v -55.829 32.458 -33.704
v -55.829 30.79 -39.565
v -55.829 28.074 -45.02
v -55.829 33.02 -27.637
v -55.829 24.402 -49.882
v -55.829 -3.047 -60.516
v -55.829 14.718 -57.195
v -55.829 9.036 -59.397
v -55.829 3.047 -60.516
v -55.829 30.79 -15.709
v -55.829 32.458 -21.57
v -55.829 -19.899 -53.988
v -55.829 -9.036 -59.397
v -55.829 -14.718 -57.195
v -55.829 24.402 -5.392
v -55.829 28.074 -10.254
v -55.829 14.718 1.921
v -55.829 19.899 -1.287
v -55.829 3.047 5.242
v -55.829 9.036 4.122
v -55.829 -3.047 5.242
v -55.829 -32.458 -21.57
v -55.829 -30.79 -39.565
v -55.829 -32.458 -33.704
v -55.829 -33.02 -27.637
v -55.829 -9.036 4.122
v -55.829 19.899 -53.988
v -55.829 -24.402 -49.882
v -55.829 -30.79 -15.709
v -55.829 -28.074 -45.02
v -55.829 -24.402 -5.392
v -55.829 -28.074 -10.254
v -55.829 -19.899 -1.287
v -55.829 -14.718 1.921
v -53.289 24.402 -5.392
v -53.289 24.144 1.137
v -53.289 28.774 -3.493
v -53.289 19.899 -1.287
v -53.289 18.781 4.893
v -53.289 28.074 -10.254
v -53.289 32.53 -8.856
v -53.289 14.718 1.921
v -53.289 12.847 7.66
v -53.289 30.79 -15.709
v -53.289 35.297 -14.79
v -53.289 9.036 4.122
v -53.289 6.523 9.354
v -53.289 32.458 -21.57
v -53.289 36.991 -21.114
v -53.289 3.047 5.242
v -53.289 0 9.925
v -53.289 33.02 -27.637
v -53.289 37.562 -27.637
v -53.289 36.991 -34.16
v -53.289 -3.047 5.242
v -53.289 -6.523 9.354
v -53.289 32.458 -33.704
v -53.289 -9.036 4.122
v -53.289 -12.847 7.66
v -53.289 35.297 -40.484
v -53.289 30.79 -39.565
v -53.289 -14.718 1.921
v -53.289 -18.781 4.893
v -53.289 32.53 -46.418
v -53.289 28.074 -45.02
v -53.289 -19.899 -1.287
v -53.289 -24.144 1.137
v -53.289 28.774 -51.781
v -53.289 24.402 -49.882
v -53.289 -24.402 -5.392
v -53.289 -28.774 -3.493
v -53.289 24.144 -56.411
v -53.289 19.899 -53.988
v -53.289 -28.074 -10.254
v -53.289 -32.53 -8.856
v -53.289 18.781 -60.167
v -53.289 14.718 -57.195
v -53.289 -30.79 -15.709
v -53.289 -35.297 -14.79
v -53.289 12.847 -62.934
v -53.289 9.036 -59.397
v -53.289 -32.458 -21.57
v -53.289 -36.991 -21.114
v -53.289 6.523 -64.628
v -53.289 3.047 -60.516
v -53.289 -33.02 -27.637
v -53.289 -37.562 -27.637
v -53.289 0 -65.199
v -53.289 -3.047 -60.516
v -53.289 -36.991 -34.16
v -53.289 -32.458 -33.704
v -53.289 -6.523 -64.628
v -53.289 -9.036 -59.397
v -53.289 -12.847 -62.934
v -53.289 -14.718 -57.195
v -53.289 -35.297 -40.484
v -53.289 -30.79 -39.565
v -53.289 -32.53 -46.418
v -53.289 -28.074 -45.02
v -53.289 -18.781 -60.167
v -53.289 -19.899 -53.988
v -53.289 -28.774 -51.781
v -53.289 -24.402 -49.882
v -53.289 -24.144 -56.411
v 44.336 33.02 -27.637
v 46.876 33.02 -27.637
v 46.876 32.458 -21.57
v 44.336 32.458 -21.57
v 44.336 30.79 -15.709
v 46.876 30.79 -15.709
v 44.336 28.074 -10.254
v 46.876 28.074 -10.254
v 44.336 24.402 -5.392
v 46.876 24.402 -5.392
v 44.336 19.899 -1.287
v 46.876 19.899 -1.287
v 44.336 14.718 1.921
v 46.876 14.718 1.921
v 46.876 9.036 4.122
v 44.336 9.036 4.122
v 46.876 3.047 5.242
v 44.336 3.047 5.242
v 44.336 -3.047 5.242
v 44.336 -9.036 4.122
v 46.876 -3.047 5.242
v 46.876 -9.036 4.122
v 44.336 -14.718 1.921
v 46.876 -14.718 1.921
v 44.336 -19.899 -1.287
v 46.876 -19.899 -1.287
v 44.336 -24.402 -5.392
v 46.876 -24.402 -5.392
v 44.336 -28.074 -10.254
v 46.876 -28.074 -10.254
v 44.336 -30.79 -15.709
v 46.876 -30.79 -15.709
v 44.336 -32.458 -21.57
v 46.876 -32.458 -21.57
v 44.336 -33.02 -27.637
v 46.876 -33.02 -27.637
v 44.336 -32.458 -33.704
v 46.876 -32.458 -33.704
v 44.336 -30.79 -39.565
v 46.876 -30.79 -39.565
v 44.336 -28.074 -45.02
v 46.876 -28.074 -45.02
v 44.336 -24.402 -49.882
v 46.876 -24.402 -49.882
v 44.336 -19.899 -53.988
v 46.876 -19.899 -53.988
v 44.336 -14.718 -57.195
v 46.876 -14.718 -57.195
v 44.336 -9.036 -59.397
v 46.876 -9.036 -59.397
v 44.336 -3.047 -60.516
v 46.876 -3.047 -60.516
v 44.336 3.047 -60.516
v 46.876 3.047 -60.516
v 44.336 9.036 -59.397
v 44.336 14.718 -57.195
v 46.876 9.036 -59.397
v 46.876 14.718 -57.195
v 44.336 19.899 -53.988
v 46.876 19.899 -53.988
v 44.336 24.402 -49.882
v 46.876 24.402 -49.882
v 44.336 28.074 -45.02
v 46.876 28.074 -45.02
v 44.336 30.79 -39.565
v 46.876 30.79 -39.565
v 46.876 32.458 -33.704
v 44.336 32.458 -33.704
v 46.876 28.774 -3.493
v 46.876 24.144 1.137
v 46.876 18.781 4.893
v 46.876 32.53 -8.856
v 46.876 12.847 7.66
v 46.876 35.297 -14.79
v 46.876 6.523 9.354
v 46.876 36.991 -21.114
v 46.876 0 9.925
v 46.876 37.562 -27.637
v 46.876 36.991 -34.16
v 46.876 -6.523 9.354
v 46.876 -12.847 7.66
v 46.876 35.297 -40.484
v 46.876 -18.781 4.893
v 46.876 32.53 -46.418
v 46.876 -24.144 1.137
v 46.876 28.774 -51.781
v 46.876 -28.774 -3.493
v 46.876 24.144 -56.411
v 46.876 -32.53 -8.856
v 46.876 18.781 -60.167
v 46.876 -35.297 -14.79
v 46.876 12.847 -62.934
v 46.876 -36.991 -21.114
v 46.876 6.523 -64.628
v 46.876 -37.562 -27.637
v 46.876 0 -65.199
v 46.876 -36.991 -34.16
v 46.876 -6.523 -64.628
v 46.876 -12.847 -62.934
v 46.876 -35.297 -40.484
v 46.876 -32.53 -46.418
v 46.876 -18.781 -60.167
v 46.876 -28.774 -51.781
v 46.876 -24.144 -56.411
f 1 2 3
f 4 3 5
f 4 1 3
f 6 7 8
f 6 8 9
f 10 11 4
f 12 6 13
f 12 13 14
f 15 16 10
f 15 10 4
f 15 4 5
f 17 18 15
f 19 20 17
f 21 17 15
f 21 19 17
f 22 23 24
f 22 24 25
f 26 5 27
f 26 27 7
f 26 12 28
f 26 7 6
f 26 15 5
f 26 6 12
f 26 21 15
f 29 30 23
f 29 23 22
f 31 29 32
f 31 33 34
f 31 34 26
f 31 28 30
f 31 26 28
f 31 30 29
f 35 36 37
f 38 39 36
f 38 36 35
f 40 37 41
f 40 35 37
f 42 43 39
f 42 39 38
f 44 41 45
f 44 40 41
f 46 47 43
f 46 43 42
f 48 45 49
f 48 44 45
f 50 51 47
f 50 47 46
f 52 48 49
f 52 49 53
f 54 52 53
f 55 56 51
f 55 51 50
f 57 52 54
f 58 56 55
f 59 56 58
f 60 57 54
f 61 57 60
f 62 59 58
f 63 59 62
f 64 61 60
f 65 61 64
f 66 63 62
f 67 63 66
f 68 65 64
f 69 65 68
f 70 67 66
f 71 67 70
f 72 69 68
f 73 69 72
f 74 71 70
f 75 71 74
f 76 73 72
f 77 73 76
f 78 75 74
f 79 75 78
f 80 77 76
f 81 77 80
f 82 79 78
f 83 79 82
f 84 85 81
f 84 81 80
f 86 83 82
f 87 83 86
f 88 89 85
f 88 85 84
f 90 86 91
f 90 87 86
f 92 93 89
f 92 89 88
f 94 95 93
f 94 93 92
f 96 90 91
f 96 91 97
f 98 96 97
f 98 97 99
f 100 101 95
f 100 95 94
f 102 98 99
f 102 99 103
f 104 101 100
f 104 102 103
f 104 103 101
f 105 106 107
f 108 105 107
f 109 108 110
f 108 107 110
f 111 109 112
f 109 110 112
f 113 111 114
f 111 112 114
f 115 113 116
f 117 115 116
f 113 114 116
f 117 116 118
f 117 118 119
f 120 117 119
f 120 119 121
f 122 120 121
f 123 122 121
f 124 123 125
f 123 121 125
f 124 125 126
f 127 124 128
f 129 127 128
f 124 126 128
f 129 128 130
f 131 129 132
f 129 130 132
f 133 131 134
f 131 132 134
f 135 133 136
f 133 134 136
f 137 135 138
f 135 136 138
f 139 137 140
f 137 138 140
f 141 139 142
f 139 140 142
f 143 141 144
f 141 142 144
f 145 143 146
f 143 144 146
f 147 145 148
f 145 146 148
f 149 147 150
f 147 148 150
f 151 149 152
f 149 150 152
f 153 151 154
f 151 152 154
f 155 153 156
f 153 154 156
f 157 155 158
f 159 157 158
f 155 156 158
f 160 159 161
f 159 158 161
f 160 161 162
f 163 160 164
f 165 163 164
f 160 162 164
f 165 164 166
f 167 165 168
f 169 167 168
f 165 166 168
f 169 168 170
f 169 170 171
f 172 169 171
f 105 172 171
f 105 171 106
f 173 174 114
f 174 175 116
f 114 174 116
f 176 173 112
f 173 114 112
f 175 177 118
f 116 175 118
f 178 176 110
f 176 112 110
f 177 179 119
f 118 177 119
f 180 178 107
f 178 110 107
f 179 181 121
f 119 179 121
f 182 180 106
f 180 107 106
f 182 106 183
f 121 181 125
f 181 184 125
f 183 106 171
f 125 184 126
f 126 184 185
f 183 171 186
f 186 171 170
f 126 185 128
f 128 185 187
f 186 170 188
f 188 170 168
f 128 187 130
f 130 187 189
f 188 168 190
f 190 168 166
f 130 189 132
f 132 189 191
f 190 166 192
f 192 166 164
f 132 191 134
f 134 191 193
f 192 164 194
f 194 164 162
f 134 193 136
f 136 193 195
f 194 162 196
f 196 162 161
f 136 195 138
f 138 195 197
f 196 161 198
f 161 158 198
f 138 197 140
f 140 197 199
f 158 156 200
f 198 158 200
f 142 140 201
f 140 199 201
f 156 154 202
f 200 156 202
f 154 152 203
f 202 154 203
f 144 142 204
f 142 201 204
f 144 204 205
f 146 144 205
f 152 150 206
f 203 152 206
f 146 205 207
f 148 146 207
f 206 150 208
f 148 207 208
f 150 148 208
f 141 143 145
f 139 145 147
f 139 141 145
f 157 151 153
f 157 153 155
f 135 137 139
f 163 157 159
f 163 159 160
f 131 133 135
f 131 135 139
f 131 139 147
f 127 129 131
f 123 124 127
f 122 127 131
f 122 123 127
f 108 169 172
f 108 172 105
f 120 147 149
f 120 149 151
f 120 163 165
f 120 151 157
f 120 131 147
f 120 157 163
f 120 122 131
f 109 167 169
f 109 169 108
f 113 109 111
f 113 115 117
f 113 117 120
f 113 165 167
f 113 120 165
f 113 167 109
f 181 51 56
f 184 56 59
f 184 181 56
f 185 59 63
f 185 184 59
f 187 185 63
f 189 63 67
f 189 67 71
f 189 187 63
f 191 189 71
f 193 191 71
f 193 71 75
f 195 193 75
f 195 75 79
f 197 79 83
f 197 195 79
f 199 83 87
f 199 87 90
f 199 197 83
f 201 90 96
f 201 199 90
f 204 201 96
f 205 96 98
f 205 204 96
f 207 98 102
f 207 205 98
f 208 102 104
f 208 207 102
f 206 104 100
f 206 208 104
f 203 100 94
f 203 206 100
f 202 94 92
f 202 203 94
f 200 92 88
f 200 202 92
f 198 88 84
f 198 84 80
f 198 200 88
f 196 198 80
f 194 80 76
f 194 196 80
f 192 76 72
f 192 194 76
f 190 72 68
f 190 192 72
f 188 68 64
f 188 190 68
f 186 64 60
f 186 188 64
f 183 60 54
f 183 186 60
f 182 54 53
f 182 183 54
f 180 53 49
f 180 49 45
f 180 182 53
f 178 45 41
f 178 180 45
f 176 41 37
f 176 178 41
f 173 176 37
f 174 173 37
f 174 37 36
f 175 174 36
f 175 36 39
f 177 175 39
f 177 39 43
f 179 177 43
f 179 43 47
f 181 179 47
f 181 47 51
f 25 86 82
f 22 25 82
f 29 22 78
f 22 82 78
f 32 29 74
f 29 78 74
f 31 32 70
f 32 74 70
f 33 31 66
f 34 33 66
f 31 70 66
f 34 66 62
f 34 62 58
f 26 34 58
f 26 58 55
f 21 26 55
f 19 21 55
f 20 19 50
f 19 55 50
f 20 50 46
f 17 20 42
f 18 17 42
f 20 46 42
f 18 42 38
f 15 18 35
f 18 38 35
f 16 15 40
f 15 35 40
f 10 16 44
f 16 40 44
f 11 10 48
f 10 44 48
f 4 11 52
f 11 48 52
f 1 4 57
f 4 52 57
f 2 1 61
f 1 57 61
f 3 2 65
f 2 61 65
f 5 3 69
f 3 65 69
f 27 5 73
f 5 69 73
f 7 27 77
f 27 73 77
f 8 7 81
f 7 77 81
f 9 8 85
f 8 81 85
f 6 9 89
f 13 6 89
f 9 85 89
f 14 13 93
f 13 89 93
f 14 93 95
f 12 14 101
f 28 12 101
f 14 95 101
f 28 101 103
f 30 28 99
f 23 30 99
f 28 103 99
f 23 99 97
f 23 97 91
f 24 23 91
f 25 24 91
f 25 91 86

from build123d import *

# Parameters (mm, degrees)
F0_W     = 100.1651920378
F0_H     = 37.5619474798
F3_R     = 33.02
F4_DEPTH = 2.54
F2_R     = 33.02
F5_DEPTH = 2.54


with BuildPart() as f1:
    # F0 (on Front) → F1 (revolve)
    with BuildSketch(Plane.XZ):
        with Locations((-3.2065082341, -8.8560683653)):
            Rectangle(F0_W, F0_H)
    revolve(axis=Axis((-3.2065082341, 0, -27.6370421052), (1, 0, 0)))

    # F3 (on face) → F4 (cut)
    with BuildSketch(Plane.YZ.offset(46.8760877848)):
        with Locations((0, -27.6370421052)):
            Circle(F3_R)
    extrude(amount=-F4_DEPTH, mode=Mode.SUBTRACT)

    # F2 (on face) → F5 (join)
    with BuildSketch(Plane(origin=(-53.2891042531, 0, 0), x_dir=(0, -1, 0), z_dir=(-1, 0, 0))):
        with Locations((0, -27.6370421052)):
            Circle(F2_R)
    extrude(amount=F5_DEPTH)


solid = f1.part
